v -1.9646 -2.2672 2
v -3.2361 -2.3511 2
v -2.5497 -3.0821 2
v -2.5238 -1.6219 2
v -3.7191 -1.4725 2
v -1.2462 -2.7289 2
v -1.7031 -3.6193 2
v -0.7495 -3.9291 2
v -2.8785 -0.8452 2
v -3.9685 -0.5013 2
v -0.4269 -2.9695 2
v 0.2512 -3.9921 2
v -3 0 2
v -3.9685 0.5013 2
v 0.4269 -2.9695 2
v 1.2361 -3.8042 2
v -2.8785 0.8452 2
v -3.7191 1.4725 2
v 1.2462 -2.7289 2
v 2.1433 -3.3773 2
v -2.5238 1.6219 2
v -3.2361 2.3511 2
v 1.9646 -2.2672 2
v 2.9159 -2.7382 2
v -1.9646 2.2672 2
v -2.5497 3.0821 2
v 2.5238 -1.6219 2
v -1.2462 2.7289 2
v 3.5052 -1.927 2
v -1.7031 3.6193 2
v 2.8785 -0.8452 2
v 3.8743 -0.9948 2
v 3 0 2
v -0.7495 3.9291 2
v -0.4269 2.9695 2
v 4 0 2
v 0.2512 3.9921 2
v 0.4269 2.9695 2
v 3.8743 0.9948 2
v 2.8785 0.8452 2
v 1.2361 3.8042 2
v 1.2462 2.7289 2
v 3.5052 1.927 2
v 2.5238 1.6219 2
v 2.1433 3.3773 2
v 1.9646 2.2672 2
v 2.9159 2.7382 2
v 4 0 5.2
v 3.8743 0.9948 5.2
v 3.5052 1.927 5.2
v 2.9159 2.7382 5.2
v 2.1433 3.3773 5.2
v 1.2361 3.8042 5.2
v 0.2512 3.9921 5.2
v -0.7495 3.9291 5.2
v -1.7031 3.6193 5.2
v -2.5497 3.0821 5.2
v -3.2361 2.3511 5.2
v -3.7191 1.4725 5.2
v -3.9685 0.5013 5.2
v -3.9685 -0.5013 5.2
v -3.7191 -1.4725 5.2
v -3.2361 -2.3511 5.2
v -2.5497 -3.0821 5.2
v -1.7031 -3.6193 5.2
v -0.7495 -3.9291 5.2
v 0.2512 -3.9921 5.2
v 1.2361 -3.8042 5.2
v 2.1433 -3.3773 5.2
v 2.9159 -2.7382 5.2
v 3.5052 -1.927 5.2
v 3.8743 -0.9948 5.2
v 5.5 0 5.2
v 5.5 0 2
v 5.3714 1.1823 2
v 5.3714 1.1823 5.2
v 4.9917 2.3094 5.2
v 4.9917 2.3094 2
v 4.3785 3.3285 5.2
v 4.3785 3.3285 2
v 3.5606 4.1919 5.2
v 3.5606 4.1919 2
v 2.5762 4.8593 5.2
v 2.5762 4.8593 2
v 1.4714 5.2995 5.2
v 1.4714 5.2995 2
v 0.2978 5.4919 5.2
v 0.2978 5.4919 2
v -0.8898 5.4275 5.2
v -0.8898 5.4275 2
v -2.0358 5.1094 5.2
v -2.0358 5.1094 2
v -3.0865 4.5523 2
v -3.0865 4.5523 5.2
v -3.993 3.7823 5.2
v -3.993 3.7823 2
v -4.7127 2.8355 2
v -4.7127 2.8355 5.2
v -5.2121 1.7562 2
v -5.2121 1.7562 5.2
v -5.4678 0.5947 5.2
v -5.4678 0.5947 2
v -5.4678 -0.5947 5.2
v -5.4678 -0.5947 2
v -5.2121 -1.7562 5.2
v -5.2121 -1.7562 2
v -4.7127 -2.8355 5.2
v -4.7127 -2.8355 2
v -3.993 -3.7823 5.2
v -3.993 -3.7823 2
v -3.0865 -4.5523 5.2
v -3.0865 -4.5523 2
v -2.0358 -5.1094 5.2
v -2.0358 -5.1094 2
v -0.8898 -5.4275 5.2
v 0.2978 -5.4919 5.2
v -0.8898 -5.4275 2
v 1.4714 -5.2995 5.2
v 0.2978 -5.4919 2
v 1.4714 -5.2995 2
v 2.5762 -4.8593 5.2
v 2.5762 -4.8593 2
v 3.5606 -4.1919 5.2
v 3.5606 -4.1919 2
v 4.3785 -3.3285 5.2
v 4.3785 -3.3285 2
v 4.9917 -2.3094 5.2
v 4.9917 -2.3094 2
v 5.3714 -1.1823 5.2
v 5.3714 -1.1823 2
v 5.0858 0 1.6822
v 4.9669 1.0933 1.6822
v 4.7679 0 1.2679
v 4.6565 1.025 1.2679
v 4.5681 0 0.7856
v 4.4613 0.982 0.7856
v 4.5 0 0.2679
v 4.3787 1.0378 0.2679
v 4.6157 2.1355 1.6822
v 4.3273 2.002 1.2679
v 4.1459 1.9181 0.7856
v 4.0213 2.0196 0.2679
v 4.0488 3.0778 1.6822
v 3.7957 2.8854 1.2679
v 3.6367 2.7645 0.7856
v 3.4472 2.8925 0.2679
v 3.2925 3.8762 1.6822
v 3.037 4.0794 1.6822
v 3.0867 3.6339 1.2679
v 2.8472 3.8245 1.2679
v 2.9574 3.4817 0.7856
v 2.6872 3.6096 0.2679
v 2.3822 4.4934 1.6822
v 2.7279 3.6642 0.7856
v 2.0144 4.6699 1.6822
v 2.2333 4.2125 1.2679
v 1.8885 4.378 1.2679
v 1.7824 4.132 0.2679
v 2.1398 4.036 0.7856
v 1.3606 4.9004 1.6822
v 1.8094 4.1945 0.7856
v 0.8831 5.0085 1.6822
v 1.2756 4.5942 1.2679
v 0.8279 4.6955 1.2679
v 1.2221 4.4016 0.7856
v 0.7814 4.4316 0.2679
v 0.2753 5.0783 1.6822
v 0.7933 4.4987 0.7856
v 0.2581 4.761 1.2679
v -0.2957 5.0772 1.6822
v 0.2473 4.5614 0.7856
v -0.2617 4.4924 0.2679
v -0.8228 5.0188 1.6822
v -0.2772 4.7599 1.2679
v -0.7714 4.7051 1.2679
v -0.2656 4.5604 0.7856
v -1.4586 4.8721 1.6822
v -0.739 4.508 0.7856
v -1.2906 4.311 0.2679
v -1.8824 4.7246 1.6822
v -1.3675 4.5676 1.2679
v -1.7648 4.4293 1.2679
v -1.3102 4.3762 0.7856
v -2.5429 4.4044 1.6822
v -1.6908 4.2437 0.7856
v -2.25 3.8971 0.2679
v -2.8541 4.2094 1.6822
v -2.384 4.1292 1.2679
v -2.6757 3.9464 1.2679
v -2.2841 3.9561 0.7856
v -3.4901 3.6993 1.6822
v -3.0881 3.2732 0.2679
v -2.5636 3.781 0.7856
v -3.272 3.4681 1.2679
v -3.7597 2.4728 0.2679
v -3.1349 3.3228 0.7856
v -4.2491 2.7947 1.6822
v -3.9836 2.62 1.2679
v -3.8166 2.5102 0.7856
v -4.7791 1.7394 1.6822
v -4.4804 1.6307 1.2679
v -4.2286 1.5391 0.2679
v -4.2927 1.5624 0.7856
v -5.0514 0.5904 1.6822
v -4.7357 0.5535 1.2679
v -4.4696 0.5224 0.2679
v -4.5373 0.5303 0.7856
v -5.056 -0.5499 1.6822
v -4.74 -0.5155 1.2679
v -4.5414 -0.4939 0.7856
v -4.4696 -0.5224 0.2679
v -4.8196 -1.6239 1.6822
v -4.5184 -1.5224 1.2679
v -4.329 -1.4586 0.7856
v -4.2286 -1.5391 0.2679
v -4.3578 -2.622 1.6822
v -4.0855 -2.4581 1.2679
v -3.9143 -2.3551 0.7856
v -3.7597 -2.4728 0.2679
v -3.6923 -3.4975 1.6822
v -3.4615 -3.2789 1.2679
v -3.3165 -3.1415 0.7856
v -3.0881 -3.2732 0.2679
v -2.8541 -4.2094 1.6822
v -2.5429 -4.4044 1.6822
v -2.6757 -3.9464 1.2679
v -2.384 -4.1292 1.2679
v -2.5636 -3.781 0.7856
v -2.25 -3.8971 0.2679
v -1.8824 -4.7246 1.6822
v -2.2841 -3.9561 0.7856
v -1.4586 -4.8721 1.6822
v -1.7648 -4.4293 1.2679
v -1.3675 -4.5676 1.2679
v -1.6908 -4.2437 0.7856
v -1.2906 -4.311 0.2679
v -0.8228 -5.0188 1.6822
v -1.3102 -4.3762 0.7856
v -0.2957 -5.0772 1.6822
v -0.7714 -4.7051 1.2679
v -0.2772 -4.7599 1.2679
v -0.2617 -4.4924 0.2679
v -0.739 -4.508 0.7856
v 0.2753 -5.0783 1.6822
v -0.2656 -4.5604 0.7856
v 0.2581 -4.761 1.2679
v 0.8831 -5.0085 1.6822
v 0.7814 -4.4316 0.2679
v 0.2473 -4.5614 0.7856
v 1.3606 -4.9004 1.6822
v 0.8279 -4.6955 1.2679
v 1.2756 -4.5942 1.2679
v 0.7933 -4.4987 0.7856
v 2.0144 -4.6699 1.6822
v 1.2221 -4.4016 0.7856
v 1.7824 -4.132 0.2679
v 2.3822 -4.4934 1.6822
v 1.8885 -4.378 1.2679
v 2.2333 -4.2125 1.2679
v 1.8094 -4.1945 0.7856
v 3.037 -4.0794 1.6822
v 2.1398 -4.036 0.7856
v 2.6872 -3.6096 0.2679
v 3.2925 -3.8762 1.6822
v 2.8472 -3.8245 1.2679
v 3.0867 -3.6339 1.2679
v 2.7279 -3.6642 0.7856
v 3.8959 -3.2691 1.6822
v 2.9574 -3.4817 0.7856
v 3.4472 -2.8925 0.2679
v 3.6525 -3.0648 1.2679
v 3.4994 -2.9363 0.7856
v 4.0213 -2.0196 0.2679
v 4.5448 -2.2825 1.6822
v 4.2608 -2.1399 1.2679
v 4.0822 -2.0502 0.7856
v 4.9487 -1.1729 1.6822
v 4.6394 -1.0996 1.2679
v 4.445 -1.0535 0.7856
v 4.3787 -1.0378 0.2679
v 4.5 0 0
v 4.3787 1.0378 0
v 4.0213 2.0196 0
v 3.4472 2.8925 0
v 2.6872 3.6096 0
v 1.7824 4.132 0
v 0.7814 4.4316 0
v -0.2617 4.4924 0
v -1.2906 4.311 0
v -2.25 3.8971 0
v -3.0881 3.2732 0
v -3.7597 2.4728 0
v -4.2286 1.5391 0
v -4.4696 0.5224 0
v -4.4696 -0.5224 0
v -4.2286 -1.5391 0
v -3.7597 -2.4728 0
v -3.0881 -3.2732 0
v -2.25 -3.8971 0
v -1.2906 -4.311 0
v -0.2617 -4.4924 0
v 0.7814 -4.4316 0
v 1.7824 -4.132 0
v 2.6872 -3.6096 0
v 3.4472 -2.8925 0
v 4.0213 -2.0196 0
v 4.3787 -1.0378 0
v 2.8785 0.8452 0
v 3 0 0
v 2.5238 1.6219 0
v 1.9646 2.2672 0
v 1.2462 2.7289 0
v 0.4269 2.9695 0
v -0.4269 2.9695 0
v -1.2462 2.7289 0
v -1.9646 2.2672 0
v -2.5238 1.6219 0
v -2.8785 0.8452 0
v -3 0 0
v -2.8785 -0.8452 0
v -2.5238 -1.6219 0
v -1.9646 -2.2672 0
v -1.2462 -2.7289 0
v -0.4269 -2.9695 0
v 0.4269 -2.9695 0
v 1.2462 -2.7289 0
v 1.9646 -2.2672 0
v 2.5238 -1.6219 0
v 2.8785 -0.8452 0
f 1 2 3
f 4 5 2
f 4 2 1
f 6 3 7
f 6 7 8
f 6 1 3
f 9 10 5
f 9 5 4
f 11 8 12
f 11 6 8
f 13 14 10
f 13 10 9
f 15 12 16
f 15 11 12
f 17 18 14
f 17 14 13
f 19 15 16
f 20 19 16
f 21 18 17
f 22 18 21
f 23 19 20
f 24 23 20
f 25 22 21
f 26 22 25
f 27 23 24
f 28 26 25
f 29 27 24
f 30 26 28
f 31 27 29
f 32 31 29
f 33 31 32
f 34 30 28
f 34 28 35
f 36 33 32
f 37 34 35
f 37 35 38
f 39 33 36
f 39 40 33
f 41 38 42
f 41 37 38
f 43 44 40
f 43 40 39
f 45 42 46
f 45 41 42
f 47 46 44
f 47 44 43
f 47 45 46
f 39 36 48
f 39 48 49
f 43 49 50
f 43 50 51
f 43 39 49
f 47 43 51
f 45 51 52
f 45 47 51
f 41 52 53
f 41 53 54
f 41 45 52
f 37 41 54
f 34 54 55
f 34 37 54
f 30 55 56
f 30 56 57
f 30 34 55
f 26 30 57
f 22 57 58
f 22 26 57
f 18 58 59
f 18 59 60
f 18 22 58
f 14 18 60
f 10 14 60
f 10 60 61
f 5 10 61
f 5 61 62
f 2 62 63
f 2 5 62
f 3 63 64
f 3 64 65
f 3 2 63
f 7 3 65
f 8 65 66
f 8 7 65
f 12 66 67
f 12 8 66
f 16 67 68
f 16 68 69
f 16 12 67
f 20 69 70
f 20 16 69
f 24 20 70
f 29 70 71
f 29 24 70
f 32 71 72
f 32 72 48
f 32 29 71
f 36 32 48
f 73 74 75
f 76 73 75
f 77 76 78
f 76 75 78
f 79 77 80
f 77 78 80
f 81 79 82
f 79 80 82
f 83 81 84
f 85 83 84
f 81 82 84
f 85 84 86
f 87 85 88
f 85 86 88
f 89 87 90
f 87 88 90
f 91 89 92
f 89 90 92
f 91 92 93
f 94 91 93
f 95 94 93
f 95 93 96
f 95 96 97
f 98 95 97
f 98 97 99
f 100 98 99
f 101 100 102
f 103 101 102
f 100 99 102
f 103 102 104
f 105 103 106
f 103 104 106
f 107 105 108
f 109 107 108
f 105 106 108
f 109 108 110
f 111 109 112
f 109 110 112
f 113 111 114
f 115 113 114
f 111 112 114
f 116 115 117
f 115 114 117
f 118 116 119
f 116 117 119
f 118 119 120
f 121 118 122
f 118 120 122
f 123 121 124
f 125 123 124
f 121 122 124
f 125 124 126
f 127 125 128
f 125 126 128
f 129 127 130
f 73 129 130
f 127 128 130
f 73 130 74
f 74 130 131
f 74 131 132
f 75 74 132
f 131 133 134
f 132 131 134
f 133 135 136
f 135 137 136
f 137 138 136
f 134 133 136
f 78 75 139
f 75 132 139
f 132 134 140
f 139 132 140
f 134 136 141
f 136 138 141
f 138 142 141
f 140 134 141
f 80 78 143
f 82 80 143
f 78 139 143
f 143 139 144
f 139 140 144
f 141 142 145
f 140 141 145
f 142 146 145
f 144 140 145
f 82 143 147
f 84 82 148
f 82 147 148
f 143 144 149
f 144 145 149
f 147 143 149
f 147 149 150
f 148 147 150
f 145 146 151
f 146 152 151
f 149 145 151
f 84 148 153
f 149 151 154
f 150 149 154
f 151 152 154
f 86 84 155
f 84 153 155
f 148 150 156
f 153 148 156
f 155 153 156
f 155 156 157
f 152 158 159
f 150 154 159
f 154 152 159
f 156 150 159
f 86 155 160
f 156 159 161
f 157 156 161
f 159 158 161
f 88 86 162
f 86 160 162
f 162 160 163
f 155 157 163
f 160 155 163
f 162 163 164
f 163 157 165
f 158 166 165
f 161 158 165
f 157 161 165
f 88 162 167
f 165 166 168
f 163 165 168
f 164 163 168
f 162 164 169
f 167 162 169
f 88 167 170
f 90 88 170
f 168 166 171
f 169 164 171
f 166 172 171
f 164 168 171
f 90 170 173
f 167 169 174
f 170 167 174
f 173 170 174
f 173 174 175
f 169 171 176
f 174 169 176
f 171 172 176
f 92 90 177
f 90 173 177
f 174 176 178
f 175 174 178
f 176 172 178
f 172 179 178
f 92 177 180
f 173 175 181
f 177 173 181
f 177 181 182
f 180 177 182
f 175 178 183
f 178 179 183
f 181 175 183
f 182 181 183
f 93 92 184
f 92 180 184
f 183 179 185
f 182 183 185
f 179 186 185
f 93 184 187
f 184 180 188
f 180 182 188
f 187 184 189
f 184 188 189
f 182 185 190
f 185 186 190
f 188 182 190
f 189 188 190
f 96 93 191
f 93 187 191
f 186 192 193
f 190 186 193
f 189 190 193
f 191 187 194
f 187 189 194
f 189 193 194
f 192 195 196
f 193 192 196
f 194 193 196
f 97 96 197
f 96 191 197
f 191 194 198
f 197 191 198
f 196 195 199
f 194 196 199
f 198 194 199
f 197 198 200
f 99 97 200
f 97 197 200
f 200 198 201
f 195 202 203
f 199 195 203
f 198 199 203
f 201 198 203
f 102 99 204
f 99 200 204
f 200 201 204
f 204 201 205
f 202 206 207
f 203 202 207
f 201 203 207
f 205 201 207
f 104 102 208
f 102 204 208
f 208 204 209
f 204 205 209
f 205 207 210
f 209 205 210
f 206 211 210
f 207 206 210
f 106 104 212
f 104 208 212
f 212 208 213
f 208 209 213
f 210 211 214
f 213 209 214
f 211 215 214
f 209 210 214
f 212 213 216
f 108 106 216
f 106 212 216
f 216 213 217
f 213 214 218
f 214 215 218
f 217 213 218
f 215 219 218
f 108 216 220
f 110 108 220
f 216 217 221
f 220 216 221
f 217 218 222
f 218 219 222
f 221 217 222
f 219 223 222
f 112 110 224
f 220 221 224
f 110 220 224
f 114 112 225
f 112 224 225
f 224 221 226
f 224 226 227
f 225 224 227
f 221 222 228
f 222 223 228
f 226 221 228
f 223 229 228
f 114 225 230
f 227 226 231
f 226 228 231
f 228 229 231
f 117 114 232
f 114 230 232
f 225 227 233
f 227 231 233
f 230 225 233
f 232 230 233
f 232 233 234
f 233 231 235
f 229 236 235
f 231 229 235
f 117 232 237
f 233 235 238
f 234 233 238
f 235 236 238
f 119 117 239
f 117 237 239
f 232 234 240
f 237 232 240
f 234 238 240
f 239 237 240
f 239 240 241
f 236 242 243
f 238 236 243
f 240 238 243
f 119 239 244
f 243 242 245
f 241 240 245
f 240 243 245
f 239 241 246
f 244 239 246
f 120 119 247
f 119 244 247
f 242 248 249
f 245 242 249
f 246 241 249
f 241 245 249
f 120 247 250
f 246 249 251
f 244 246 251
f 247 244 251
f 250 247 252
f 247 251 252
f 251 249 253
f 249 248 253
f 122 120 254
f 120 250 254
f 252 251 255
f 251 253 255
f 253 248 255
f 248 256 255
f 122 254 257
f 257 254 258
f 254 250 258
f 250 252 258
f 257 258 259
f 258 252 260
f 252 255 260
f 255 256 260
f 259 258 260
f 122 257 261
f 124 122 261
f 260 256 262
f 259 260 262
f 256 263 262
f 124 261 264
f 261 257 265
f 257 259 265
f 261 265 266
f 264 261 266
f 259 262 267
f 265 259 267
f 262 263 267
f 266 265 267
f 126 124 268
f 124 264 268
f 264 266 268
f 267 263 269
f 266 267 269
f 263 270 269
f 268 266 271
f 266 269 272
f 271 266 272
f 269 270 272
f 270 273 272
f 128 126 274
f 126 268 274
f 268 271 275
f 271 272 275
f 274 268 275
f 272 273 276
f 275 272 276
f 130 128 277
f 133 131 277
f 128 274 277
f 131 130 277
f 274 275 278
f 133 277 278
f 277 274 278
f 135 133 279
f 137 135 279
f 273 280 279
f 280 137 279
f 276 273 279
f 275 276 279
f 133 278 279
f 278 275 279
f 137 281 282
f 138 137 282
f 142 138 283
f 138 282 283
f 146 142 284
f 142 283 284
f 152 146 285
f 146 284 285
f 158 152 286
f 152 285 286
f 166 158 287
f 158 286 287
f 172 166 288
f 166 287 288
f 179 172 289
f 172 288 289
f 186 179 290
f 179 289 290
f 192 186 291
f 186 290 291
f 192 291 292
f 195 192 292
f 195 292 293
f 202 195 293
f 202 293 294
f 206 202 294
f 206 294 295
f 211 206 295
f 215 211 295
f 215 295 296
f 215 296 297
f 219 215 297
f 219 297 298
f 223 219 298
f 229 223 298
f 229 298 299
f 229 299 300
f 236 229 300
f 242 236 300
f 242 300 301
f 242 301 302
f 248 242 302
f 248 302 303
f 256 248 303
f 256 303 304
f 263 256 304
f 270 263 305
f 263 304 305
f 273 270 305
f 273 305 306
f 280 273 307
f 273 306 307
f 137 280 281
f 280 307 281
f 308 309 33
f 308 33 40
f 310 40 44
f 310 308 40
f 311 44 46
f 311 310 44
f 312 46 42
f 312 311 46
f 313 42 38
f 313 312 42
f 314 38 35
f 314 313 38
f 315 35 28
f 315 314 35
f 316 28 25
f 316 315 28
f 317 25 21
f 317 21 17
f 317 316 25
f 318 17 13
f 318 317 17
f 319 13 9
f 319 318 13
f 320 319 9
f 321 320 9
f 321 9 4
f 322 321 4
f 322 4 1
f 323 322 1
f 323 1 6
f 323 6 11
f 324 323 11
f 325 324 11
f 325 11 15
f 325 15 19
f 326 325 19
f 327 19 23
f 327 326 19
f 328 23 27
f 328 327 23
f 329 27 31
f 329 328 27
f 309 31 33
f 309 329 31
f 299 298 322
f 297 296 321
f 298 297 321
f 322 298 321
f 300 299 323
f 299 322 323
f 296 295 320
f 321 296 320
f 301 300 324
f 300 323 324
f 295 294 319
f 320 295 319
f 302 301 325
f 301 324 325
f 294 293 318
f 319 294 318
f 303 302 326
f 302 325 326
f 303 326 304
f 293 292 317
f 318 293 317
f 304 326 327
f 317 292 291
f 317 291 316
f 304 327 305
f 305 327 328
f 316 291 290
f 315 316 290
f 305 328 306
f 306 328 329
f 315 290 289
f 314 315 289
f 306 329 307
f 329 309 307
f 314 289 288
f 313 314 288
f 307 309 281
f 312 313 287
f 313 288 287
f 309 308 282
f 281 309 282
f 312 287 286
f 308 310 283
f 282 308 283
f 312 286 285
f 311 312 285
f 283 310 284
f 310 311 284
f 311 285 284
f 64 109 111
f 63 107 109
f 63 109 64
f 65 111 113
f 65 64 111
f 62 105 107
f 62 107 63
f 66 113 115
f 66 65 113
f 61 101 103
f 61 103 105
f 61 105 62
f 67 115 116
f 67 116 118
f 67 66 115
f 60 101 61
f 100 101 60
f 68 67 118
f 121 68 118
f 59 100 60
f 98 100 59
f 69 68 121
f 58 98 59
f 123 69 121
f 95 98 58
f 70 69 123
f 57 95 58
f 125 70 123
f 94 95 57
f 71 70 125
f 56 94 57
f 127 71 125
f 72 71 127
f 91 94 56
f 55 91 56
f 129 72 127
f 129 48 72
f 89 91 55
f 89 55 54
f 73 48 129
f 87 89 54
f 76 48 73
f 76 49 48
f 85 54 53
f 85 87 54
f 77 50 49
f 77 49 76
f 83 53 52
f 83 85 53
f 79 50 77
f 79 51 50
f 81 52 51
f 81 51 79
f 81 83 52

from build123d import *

# Parameters (mm, degrees)
CROQUIS1_R              = 4.5
CROQUIS1_R_2            = 3
SALIENTE_EXTRUIR1_DEPTH = 2
CROQUIS2_R              = 5.5
CROQUIS2_R_2            = 4
SALIENTE_EXTRUIR2_DEPTH = 3.2
REDONDEO1_R             = 2


with BuildPart() as part:
    # Croquis1 → Saliente-Extruir1 (new body)
    with BuildSketch(Plane.XY):
        Circle(CROQUIS1_R)
        Circle(CROQUIS1_R_2, mode=Mode.SUBTRACT)
    extrude(amount=SALIENTE_EXTRUIR1_DEPTH)

    # Croquis2 → Saliente-Extruir2 (add)
    with BuildSketch(Plane.XY.offset(2)):
        Circle(CROQUIS2_R)
        Circle(CROQUIS2_R_2, mode=Mode.SUBTRACT)
    extrude(amount=SALIENTE_EXTRUIR2_DEPTH)

    # Redondeo1
    # the kernel refuses this fillet: 2 mm, written as the material it adds along each edge
    with BuildSketch(Plane(origin=(0, 0, 2), x_dir=(1, 0, 0), z_dir=(0, -1, 0))) as redondeo1_piece_1:
        with BuildLine():
            CenterArc((6.5, -1.732050808), REDONDEO1_R, 120, 60)
            Line((5.5, 0), (5.48, 0.034641016))
            ThreePointArc((5.48, 0.034641016), (5, 0.04), (4.5, 0.04))
            Line((4.5, 0.04), (4.46, 0))
            Line((4.46, 0), (4.46, -1.732050808))
            Line((4.46, -1.732050808), (4.5, -1.732050808))
        make_face()
    revolve(axis=Axis((0, 0, 2), (0, 0, 1)))


solid = part.part
